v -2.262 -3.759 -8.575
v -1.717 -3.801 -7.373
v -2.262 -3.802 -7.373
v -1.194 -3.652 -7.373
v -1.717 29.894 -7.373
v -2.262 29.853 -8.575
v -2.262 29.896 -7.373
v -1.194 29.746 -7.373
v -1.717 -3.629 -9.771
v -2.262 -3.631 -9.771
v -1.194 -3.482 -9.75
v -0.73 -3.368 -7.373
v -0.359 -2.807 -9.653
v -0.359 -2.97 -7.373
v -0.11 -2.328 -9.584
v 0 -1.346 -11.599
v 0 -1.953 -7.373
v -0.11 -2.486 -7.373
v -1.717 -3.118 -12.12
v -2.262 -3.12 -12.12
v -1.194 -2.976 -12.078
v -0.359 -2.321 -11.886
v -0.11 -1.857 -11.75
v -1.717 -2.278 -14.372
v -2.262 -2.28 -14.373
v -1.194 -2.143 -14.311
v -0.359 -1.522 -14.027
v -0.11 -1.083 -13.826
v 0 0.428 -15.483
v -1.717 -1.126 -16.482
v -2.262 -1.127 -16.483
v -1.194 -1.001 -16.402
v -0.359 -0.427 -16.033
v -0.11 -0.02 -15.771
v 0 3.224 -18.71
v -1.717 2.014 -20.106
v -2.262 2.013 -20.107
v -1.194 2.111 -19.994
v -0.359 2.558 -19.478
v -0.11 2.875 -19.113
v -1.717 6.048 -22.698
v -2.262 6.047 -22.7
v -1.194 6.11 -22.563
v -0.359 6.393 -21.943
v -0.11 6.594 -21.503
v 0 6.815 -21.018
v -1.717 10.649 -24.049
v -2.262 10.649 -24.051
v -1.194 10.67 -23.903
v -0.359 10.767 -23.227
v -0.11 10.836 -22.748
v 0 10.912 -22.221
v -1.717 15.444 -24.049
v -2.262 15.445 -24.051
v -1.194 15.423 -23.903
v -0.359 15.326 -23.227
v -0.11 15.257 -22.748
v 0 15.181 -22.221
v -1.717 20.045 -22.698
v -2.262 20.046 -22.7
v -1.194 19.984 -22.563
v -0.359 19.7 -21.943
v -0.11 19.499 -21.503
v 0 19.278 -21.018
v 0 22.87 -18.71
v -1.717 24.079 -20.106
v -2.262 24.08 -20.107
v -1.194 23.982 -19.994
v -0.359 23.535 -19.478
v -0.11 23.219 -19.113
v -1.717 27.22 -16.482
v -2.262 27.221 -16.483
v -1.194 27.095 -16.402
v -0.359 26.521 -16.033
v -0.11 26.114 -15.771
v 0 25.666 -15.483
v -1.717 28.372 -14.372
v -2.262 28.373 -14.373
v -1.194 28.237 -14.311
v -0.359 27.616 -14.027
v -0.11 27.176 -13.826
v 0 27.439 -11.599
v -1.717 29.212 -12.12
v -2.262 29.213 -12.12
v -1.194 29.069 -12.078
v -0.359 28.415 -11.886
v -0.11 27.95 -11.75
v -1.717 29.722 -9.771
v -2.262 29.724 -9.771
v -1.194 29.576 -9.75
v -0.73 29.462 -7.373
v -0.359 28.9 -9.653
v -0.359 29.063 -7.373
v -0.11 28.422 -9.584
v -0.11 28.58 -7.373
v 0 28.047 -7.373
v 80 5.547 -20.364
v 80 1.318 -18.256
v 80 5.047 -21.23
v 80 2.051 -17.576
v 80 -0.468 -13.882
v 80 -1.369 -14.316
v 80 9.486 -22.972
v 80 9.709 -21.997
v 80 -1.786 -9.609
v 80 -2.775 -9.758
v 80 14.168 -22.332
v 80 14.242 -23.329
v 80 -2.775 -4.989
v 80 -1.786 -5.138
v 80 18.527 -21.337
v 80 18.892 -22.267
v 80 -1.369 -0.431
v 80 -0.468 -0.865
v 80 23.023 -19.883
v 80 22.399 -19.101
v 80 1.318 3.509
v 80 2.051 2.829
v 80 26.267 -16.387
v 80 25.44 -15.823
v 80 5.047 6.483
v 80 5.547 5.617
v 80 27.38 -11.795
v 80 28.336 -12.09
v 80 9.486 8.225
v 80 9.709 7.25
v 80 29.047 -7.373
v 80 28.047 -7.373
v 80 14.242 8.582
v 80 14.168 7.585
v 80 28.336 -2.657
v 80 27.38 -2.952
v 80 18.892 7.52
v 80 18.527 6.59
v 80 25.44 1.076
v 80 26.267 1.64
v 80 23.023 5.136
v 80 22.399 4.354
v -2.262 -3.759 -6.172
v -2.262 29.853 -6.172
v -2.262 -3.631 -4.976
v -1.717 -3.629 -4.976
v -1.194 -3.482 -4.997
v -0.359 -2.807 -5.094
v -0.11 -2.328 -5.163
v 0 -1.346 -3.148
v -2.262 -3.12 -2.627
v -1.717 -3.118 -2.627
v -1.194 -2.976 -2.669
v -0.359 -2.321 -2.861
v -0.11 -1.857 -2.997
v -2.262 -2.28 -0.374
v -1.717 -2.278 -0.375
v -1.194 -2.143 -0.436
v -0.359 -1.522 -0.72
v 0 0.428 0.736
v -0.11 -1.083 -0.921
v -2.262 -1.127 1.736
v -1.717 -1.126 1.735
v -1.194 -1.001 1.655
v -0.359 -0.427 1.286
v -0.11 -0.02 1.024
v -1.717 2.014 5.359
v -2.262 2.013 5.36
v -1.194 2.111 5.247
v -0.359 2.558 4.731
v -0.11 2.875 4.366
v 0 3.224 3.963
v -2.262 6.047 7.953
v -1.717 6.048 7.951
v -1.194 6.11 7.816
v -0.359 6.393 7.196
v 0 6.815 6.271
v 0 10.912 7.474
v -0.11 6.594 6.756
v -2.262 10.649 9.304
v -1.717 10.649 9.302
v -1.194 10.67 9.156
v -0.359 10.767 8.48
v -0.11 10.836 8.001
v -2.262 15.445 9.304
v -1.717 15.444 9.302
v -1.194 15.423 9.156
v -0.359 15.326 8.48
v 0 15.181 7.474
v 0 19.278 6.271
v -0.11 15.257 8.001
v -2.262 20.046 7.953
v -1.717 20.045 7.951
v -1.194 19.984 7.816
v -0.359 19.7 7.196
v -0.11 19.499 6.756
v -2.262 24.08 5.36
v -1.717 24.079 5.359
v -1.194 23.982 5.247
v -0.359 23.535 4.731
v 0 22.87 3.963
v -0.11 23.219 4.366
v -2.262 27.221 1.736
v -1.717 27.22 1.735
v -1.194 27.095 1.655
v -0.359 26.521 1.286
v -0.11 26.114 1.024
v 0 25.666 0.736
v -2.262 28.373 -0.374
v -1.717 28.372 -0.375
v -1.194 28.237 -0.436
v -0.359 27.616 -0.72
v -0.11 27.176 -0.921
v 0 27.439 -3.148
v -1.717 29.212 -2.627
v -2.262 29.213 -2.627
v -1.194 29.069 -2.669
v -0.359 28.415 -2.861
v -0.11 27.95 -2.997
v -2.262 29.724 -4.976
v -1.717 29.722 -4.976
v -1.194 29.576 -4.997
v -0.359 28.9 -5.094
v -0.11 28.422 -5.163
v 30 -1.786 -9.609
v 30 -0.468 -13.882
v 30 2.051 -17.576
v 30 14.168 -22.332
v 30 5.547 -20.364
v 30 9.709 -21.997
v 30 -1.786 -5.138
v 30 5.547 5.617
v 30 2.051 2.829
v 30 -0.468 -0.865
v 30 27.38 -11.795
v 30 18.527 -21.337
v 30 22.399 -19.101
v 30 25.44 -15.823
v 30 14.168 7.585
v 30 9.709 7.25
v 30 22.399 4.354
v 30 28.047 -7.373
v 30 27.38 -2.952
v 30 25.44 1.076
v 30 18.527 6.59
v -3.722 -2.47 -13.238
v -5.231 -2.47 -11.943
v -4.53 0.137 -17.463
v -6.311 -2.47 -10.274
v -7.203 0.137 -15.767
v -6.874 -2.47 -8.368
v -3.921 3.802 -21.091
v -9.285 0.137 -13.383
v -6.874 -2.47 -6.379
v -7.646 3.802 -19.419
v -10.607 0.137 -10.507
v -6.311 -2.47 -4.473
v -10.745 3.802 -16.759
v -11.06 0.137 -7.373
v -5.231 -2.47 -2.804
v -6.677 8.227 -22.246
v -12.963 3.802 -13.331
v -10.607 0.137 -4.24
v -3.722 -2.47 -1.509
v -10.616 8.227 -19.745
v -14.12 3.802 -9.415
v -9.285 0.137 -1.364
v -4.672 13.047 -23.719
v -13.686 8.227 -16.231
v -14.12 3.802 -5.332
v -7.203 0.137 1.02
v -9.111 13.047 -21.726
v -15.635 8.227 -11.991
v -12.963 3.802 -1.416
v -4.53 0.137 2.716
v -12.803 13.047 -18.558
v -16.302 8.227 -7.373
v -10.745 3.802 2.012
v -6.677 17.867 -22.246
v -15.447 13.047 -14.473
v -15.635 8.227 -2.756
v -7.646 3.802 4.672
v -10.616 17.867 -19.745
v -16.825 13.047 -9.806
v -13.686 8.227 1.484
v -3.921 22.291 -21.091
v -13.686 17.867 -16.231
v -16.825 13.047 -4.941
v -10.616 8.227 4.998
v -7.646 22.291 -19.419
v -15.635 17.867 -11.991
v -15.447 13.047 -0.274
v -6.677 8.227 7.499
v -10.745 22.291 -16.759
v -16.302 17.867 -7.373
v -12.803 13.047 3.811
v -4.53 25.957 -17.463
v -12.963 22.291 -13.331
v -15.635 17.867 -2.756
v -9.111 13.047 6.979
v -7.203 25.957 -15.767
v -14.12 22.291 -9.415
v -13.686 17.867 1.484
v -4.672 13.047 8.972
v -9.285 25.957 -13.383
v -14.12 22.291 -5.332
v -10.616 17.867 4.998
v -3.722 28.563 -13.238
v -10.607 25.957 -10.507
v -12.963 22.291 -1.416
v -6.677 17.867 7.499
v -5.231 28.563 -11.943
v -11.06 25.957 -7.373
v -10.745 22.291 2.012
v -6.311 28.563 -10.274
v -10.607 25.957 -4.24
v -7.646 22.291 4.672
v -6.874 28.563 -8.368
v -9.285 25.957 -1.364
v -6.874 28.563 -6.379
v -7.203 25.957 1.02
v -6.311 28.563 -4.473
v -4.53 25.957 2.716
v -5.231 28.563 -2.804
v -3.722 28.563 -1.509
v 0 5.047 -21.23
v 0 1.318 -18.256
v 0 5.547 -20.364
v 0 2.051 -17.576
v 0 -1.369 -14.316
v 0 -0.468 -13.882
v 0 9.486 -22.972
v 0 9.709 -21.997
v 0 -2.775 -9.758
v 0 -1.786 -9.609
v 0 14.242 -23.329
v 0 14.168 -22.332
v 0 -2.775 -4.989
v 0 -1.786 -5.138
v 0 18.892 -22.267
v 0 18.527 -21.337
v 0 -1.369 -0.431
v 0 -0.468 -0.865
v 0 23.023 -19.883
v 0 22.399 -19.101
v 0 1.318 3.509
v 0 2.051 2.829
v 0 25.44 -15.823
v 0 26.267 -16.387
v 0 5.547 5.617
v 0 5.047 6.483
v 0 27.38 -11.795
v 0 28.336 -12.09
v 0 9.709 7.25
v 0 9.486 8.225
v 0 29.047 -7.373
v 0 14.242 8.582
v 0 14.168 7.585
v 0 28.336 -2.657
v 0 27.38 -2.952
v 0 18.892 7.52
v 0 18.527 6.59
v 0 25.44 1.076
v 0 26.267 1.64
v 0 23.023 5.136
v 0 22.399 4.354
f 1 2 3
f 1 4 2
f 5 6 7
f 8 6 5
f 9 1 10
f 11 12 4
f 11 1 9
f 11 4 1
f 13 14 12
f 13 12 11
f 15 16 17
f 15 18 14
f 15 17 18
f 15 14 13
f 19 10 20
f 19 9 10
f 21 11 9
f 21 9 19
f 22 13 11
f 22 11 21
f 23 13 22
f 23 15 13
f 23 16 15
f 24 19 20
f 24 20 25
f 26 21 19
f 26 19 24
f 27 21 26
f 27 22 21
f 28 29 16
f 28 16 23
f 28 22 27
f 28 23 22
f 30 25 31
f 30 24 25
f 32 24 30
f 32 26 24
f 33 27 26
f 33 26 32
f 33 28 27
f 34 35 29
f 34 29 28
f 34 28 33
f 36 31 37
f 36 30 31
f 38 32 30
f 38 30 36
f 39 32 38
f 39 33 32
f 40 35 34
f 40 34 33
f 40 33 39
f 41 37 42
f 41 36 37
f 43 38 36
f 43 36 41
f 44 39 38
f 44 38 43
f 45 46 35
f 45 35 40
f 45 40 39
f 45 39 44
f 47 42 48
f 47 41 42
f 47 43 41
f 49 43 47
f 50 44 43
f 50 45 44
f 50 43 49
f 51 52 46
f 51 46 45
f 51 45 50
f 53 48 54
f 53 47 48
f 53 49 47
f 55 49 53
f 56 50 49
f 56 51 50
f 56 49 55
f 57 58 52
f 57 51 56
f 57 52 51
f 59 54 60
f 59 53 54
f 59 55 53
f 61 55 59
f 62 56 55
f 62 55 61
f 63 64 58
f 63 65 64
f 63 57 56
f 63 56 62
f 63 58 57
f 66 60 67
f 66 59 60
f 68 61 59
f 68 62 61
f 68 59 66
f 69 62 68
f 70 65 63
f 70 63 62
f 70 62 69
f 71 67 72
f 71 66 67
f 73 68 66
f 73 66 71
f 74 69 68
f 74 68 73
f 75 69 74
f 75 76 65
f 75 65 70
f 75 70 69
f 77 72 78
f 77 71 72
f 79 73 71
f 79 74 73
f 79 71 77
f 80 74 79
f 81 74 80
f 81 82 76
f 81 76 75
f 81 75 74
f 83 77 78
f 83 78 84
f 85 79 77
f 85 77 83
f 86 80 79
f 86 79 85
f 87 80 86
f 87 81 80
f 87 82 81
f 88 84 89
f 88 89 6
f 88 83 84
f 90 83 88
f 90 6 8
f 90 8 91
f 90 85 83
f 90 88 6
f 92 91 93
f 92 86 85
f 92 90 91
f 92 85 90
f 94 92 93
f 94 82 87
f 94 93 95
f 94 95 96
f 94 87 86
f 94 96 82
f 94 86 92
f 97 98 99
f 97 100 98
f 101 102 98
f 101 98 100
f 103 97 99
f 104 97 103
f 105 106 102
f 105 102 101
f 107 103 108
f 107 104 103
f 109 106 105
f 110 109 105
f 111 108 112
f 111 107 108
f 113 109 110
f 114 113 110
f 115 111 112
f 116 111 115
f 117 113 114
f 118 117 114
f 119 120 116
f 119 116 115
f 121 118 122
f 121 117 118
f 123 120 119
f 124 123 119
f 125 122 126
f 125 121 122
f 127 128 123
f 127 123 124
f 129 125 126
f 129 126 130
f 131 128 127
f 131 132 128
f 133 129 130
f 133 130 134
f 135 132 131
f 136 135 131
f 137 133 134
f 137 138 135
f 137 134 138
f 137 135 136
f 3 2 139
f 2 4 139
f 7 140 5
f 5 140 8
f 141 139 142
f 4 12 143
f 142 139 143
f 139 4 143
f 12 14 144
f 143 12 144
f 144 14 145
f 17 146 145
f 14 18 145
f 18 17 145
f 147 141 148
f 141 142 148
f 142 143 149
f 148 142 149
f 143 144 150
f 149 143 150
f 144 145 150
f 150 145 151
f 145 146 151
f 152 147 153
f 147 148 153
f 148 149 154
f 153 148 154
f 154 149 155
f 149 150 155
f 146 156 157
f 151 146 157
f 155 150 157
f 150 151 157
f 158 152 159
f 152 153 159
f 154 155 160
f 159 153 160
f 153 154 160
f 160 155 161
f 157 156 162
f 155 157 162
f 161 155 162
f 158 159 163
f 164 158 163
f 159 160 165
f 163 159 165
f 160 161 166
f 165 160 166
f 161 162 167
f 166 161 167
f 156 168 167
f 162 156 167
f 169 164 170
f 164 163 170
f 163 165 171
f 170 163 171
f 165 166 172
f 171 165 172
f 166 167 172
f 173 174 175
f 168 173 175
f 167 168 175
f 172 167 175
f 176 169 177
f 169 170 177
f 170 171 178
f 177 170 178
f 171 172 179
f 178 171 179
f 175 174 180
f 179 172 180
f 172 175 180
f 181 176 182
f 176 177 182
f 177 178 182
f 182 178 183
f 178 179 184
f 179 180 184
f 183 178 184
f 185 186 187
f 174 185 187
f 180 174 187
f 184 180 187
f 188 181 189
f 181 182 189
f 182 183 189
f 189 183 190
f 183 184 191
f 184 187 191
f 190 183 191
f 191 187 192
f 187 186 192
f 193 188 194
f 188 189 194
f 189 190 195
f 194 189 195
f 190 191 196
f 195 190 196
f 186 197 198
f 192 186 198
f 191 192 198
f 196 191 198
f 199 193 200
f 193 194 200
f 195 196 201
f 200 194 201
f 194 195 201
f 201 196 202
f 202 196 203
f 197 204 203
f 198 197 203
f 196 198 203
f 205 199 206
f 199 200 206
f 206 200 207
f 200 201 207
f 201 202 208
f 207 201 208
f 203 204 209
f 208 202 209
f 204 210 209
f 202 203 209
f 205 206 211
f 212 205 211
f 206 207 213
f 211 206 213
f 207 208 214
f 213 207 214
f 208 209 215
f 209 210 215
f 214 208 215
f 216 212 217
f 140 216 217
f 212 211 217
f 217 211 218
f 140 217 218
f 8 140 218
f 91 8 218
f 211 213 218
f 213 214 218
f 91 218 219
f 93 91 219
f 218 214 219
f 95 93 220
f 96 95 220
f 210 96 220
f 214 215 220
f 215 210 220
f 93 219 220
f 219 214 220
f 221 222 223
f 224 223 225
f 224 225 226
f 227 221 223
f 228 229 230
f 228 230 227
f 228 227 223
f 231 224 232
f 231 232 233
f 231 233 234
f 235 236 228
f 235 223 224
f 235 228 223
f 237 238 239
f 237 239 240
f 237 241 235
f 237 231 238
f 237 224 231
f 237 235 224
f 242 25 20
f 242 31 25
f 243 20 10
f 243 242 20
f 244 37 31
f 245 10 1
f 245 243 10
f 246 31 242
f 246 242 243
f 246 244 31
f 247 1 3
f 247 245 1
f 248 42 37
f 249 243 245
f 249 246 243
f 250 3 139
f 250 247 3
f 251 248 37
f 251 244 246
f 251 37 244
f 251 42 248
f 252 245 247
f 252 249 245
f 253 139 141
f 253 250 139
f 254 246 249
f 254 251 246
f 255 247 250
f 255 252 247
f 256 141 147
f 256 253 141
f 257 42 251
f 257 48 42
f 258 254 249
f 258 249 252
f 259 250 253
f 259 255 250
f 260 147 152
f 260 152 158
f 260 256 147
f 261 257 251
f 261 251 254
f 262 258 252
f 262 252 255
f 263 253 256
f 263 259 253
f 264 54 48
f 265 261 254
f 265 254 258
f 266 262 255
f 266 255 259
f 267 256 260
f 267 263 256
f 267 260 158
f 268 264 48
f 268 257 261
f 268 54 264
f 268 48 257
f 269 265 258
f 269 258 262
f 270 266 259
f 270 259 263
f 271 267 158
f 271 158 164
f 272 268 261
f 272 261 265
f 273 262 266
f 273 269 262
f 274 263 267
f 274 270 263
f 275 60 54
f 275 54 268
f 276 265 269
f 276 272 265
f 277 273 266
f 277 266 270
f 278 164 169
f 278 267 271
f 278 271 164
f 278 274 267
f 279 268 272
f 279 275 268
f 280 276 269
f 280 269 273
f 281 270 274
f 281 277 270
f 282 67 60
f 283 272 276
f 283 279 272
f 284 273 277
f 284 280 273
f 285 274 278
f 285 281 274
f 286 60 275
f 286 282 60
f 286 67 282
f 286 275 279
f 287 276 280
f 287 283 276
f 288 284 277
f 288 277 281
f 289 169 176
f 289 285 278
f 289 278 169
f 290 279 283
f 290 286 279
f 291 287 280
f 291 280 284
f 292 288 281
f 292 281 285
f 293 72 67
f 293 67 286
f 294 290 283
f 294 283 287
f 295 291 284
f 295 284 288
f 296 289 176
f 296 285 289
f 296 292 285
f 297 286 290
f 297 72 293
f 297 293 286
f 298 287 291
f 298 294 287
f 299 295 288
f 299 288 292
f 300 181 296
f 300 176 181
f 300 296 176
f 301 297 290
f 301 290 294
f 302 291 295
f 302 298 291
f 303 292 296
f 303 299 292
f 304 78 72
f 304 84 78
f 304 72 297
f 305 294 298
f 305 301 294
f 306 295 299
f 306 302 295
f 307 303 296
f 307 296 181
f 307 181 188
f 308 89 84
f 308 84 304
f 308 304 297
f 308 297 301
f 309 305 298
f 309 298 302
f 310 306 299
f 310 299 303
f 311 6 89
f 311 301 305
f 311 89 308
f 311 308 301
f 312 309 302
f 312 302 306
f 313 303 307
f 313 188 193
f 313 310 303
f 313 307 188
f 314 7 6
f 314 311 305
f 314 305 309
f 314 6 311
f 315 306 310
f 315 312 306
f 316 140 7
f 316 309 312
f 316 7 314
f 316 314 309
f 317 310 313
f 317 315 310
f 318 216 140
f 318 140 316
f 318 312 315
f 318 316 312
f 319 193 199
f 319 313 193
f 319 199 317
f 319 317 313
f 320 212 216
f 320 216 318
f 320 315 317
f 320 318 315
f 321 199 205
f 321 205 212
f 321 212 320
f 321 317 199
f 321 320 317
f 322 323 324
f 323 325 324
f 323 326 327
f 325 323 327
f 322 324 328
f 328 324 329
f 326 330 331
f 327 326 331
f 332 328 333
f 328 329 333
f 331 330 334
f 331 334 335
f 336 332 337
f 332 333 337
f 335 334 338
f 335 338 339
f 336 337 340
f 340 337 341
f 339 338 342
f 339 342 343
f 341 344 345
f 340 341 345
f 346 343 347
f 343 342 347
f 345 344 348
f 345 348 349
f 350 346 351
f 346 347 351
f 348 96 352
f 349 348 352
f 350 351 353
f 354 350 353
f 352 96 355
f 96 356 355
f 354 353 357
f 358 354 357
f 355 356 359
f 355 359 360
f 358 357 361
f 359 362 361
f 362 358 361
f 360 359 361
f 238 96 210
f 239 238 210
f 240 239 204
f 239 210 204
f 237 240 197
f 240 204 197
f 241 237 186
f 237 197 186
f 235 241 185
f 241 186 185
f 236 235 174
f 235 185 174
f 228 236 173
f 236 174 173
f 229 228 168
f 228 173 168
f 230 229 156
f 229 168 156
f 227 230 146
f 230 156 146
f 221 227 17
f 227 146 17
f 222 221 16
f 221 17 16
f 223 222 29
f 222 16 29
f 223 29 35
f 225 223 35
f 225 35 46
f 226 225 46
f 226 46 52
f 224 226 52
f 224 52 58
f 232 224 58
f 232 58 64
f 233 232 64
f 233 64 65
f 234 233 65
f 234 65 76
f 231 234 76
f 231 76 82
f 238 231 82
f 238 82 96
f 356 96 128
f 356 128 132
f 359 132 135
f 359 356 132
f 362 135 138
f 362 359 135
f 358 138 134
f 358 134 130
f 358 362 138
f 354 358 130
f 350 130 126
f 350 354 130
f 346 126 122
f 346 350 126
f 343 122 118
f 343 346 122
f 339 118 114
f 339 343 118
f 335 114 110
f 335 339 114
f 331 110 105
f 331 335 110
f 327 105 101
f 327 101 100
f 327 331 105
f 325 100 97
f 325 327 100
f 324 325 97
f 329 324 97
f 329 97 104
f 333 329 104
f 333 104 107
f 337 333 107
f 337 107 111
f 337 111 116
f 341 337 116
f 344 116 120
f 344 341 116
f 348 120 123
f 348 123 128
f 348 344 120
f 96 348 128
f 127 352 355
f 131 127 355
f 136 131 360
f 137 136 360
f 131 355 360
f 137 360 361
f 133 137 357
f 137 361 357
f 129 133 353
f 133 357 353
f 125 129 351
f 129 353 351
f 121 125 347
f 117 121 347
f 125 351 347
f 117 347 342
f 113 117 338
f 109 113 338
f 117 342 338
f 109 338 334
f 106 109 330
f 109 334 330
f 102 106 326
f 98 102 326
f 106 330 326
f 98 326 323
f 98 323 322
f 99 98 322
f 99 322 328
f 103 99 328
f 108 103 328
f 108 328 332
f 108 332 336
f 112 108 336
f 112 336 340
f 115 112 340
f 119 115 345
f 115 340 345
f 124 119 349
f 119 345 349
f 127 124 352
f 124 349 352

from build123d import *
from build123d import SkipClean  # not in build123d's __all__

# Parameters (mm, degrees)
F1_ANGLE    = 180
F2_R        = 15
F3_DEPTH    = 30
F4_R        = 16
F4_R_2      = 15
F5_DEPTH    = 80
F6_T2_ANGLE = 180
F6_T4_ANGLE = 180


# Not quite as in the source:
# - a fillet or chamfer that OpenCascade refuses, or shapes differently, is made with other operations: its cross-section is extruded or revolved along the edge and cut away or added


with BuildPart() as f1:
    # F0 (on Right) → F1 (revolve)
    with BuildSketch(Plane.YZ):
        with BuildLine():
            Line((30.0467135459, -7.373497352), (-3.9532864541, -7.373497352))
            ThreePointArc((-3.9532864541, -7.373497352), (13.0467135459, -24.373497352), (30.0467135459, -7.373497352))
        make_face()
    revolve(axis=Axis((0, 13.0467135459, -7.373497352), (0, 1, 0)), revolution_arc=F1_ANGLE)

    # F2 (on face) → F3 (join)
    with BuildSketch(Plane.YZ):
        with Locations((13.0467135459, -7.373497352)):
            Circle(F2_R)
    extrude(amount=F3_DEPTH)

    # F6: fillet of radius 2 on 1 edges, made by hand

    # F6_s1 → F6_t2 (revolve, cut)
    with BuildSketch(Plane.XY.offset(-7.373497352)):
        with BuildLine():
            ThreePointArc((-2.2616240205, -3.802175343), (-0.7297029178, -3.3683812365), (0, -1.9532864541))
            Line((0, -1.9532864541), (0.0399110121, -1.9559531207))
            ThreePointArc((0.0399110121, -1.9559531207), (0.04, -2.9532864541), (0.04, -3.9532864541))
            Line((0.04, -3.9532864541), (0, -3.9932864541))
            ThreePointArc((0, -3.9932864541), (-1.136, -3.9553776196), (-2.2669454887, -3.8418197874))
            Line((-2.2669454887, -3.8418197874), (-2.2616240205, -3.802175343))
        make_face()
    revolve(axis=Axis((0, 13.0467135459, -7.373497352), (1, 0, 0)), revolution_arc=F6_T2_ANGLE, mode=Mode.SUBTRACT)

    # F6_s3 → F6_t4 (revolve, cut)
    with BuildSketch(Plane.XY.offset(-7.373497352)):
        with BuildLine():
            ThreePointArc((-2.2616240205, -3.802175343), (-0.7297029178, -3.3683812365), (0, -1.9532864541))
            Line((0, -1.9532864541), (0.0399110121, -1.9559531207))
            ThreePointArc((0.0399110121, -1.9559531207), (0.04, -2.9532864541), (0.04, -3.9532864541))
            Line((0.04, -3.9532864541), (0, -3.9932864541))
            ThreePointArc((0, -3.9932864541), (-1.136, -3.9553776196), (-2.2669454887, -3.8418197874))
            Line((-2.2669454887, -3.8418197874), (-2.2616240205, -3.802175343))
        make_face()
    with SkipClean():  # cleaning this boolean's faces spoils the solid; the shape is the same uncleaned
        revolve(axis=Axis((0, 13.0467135459, -7.373497352), (-1, 0, 0)), revolution_arc=F6_T4_ANGLE, mode=Mode.SUBTRACT)


with BuildPart() as f5:
    # F4 (on face) → F5 (new body)
    with BuildSketch(Plane.YZ):
        with Locations((13.0467135459, -7.373497352)):
            Circle(F4_R)
        with Locations((13.0467135459, -7.373497352)):
            Circle(F4_R_2, mode=Mode.SUBTRACT)
    extrude(amount=F5_DEPTH)


solid = Compound([f1.part, f5.part])
